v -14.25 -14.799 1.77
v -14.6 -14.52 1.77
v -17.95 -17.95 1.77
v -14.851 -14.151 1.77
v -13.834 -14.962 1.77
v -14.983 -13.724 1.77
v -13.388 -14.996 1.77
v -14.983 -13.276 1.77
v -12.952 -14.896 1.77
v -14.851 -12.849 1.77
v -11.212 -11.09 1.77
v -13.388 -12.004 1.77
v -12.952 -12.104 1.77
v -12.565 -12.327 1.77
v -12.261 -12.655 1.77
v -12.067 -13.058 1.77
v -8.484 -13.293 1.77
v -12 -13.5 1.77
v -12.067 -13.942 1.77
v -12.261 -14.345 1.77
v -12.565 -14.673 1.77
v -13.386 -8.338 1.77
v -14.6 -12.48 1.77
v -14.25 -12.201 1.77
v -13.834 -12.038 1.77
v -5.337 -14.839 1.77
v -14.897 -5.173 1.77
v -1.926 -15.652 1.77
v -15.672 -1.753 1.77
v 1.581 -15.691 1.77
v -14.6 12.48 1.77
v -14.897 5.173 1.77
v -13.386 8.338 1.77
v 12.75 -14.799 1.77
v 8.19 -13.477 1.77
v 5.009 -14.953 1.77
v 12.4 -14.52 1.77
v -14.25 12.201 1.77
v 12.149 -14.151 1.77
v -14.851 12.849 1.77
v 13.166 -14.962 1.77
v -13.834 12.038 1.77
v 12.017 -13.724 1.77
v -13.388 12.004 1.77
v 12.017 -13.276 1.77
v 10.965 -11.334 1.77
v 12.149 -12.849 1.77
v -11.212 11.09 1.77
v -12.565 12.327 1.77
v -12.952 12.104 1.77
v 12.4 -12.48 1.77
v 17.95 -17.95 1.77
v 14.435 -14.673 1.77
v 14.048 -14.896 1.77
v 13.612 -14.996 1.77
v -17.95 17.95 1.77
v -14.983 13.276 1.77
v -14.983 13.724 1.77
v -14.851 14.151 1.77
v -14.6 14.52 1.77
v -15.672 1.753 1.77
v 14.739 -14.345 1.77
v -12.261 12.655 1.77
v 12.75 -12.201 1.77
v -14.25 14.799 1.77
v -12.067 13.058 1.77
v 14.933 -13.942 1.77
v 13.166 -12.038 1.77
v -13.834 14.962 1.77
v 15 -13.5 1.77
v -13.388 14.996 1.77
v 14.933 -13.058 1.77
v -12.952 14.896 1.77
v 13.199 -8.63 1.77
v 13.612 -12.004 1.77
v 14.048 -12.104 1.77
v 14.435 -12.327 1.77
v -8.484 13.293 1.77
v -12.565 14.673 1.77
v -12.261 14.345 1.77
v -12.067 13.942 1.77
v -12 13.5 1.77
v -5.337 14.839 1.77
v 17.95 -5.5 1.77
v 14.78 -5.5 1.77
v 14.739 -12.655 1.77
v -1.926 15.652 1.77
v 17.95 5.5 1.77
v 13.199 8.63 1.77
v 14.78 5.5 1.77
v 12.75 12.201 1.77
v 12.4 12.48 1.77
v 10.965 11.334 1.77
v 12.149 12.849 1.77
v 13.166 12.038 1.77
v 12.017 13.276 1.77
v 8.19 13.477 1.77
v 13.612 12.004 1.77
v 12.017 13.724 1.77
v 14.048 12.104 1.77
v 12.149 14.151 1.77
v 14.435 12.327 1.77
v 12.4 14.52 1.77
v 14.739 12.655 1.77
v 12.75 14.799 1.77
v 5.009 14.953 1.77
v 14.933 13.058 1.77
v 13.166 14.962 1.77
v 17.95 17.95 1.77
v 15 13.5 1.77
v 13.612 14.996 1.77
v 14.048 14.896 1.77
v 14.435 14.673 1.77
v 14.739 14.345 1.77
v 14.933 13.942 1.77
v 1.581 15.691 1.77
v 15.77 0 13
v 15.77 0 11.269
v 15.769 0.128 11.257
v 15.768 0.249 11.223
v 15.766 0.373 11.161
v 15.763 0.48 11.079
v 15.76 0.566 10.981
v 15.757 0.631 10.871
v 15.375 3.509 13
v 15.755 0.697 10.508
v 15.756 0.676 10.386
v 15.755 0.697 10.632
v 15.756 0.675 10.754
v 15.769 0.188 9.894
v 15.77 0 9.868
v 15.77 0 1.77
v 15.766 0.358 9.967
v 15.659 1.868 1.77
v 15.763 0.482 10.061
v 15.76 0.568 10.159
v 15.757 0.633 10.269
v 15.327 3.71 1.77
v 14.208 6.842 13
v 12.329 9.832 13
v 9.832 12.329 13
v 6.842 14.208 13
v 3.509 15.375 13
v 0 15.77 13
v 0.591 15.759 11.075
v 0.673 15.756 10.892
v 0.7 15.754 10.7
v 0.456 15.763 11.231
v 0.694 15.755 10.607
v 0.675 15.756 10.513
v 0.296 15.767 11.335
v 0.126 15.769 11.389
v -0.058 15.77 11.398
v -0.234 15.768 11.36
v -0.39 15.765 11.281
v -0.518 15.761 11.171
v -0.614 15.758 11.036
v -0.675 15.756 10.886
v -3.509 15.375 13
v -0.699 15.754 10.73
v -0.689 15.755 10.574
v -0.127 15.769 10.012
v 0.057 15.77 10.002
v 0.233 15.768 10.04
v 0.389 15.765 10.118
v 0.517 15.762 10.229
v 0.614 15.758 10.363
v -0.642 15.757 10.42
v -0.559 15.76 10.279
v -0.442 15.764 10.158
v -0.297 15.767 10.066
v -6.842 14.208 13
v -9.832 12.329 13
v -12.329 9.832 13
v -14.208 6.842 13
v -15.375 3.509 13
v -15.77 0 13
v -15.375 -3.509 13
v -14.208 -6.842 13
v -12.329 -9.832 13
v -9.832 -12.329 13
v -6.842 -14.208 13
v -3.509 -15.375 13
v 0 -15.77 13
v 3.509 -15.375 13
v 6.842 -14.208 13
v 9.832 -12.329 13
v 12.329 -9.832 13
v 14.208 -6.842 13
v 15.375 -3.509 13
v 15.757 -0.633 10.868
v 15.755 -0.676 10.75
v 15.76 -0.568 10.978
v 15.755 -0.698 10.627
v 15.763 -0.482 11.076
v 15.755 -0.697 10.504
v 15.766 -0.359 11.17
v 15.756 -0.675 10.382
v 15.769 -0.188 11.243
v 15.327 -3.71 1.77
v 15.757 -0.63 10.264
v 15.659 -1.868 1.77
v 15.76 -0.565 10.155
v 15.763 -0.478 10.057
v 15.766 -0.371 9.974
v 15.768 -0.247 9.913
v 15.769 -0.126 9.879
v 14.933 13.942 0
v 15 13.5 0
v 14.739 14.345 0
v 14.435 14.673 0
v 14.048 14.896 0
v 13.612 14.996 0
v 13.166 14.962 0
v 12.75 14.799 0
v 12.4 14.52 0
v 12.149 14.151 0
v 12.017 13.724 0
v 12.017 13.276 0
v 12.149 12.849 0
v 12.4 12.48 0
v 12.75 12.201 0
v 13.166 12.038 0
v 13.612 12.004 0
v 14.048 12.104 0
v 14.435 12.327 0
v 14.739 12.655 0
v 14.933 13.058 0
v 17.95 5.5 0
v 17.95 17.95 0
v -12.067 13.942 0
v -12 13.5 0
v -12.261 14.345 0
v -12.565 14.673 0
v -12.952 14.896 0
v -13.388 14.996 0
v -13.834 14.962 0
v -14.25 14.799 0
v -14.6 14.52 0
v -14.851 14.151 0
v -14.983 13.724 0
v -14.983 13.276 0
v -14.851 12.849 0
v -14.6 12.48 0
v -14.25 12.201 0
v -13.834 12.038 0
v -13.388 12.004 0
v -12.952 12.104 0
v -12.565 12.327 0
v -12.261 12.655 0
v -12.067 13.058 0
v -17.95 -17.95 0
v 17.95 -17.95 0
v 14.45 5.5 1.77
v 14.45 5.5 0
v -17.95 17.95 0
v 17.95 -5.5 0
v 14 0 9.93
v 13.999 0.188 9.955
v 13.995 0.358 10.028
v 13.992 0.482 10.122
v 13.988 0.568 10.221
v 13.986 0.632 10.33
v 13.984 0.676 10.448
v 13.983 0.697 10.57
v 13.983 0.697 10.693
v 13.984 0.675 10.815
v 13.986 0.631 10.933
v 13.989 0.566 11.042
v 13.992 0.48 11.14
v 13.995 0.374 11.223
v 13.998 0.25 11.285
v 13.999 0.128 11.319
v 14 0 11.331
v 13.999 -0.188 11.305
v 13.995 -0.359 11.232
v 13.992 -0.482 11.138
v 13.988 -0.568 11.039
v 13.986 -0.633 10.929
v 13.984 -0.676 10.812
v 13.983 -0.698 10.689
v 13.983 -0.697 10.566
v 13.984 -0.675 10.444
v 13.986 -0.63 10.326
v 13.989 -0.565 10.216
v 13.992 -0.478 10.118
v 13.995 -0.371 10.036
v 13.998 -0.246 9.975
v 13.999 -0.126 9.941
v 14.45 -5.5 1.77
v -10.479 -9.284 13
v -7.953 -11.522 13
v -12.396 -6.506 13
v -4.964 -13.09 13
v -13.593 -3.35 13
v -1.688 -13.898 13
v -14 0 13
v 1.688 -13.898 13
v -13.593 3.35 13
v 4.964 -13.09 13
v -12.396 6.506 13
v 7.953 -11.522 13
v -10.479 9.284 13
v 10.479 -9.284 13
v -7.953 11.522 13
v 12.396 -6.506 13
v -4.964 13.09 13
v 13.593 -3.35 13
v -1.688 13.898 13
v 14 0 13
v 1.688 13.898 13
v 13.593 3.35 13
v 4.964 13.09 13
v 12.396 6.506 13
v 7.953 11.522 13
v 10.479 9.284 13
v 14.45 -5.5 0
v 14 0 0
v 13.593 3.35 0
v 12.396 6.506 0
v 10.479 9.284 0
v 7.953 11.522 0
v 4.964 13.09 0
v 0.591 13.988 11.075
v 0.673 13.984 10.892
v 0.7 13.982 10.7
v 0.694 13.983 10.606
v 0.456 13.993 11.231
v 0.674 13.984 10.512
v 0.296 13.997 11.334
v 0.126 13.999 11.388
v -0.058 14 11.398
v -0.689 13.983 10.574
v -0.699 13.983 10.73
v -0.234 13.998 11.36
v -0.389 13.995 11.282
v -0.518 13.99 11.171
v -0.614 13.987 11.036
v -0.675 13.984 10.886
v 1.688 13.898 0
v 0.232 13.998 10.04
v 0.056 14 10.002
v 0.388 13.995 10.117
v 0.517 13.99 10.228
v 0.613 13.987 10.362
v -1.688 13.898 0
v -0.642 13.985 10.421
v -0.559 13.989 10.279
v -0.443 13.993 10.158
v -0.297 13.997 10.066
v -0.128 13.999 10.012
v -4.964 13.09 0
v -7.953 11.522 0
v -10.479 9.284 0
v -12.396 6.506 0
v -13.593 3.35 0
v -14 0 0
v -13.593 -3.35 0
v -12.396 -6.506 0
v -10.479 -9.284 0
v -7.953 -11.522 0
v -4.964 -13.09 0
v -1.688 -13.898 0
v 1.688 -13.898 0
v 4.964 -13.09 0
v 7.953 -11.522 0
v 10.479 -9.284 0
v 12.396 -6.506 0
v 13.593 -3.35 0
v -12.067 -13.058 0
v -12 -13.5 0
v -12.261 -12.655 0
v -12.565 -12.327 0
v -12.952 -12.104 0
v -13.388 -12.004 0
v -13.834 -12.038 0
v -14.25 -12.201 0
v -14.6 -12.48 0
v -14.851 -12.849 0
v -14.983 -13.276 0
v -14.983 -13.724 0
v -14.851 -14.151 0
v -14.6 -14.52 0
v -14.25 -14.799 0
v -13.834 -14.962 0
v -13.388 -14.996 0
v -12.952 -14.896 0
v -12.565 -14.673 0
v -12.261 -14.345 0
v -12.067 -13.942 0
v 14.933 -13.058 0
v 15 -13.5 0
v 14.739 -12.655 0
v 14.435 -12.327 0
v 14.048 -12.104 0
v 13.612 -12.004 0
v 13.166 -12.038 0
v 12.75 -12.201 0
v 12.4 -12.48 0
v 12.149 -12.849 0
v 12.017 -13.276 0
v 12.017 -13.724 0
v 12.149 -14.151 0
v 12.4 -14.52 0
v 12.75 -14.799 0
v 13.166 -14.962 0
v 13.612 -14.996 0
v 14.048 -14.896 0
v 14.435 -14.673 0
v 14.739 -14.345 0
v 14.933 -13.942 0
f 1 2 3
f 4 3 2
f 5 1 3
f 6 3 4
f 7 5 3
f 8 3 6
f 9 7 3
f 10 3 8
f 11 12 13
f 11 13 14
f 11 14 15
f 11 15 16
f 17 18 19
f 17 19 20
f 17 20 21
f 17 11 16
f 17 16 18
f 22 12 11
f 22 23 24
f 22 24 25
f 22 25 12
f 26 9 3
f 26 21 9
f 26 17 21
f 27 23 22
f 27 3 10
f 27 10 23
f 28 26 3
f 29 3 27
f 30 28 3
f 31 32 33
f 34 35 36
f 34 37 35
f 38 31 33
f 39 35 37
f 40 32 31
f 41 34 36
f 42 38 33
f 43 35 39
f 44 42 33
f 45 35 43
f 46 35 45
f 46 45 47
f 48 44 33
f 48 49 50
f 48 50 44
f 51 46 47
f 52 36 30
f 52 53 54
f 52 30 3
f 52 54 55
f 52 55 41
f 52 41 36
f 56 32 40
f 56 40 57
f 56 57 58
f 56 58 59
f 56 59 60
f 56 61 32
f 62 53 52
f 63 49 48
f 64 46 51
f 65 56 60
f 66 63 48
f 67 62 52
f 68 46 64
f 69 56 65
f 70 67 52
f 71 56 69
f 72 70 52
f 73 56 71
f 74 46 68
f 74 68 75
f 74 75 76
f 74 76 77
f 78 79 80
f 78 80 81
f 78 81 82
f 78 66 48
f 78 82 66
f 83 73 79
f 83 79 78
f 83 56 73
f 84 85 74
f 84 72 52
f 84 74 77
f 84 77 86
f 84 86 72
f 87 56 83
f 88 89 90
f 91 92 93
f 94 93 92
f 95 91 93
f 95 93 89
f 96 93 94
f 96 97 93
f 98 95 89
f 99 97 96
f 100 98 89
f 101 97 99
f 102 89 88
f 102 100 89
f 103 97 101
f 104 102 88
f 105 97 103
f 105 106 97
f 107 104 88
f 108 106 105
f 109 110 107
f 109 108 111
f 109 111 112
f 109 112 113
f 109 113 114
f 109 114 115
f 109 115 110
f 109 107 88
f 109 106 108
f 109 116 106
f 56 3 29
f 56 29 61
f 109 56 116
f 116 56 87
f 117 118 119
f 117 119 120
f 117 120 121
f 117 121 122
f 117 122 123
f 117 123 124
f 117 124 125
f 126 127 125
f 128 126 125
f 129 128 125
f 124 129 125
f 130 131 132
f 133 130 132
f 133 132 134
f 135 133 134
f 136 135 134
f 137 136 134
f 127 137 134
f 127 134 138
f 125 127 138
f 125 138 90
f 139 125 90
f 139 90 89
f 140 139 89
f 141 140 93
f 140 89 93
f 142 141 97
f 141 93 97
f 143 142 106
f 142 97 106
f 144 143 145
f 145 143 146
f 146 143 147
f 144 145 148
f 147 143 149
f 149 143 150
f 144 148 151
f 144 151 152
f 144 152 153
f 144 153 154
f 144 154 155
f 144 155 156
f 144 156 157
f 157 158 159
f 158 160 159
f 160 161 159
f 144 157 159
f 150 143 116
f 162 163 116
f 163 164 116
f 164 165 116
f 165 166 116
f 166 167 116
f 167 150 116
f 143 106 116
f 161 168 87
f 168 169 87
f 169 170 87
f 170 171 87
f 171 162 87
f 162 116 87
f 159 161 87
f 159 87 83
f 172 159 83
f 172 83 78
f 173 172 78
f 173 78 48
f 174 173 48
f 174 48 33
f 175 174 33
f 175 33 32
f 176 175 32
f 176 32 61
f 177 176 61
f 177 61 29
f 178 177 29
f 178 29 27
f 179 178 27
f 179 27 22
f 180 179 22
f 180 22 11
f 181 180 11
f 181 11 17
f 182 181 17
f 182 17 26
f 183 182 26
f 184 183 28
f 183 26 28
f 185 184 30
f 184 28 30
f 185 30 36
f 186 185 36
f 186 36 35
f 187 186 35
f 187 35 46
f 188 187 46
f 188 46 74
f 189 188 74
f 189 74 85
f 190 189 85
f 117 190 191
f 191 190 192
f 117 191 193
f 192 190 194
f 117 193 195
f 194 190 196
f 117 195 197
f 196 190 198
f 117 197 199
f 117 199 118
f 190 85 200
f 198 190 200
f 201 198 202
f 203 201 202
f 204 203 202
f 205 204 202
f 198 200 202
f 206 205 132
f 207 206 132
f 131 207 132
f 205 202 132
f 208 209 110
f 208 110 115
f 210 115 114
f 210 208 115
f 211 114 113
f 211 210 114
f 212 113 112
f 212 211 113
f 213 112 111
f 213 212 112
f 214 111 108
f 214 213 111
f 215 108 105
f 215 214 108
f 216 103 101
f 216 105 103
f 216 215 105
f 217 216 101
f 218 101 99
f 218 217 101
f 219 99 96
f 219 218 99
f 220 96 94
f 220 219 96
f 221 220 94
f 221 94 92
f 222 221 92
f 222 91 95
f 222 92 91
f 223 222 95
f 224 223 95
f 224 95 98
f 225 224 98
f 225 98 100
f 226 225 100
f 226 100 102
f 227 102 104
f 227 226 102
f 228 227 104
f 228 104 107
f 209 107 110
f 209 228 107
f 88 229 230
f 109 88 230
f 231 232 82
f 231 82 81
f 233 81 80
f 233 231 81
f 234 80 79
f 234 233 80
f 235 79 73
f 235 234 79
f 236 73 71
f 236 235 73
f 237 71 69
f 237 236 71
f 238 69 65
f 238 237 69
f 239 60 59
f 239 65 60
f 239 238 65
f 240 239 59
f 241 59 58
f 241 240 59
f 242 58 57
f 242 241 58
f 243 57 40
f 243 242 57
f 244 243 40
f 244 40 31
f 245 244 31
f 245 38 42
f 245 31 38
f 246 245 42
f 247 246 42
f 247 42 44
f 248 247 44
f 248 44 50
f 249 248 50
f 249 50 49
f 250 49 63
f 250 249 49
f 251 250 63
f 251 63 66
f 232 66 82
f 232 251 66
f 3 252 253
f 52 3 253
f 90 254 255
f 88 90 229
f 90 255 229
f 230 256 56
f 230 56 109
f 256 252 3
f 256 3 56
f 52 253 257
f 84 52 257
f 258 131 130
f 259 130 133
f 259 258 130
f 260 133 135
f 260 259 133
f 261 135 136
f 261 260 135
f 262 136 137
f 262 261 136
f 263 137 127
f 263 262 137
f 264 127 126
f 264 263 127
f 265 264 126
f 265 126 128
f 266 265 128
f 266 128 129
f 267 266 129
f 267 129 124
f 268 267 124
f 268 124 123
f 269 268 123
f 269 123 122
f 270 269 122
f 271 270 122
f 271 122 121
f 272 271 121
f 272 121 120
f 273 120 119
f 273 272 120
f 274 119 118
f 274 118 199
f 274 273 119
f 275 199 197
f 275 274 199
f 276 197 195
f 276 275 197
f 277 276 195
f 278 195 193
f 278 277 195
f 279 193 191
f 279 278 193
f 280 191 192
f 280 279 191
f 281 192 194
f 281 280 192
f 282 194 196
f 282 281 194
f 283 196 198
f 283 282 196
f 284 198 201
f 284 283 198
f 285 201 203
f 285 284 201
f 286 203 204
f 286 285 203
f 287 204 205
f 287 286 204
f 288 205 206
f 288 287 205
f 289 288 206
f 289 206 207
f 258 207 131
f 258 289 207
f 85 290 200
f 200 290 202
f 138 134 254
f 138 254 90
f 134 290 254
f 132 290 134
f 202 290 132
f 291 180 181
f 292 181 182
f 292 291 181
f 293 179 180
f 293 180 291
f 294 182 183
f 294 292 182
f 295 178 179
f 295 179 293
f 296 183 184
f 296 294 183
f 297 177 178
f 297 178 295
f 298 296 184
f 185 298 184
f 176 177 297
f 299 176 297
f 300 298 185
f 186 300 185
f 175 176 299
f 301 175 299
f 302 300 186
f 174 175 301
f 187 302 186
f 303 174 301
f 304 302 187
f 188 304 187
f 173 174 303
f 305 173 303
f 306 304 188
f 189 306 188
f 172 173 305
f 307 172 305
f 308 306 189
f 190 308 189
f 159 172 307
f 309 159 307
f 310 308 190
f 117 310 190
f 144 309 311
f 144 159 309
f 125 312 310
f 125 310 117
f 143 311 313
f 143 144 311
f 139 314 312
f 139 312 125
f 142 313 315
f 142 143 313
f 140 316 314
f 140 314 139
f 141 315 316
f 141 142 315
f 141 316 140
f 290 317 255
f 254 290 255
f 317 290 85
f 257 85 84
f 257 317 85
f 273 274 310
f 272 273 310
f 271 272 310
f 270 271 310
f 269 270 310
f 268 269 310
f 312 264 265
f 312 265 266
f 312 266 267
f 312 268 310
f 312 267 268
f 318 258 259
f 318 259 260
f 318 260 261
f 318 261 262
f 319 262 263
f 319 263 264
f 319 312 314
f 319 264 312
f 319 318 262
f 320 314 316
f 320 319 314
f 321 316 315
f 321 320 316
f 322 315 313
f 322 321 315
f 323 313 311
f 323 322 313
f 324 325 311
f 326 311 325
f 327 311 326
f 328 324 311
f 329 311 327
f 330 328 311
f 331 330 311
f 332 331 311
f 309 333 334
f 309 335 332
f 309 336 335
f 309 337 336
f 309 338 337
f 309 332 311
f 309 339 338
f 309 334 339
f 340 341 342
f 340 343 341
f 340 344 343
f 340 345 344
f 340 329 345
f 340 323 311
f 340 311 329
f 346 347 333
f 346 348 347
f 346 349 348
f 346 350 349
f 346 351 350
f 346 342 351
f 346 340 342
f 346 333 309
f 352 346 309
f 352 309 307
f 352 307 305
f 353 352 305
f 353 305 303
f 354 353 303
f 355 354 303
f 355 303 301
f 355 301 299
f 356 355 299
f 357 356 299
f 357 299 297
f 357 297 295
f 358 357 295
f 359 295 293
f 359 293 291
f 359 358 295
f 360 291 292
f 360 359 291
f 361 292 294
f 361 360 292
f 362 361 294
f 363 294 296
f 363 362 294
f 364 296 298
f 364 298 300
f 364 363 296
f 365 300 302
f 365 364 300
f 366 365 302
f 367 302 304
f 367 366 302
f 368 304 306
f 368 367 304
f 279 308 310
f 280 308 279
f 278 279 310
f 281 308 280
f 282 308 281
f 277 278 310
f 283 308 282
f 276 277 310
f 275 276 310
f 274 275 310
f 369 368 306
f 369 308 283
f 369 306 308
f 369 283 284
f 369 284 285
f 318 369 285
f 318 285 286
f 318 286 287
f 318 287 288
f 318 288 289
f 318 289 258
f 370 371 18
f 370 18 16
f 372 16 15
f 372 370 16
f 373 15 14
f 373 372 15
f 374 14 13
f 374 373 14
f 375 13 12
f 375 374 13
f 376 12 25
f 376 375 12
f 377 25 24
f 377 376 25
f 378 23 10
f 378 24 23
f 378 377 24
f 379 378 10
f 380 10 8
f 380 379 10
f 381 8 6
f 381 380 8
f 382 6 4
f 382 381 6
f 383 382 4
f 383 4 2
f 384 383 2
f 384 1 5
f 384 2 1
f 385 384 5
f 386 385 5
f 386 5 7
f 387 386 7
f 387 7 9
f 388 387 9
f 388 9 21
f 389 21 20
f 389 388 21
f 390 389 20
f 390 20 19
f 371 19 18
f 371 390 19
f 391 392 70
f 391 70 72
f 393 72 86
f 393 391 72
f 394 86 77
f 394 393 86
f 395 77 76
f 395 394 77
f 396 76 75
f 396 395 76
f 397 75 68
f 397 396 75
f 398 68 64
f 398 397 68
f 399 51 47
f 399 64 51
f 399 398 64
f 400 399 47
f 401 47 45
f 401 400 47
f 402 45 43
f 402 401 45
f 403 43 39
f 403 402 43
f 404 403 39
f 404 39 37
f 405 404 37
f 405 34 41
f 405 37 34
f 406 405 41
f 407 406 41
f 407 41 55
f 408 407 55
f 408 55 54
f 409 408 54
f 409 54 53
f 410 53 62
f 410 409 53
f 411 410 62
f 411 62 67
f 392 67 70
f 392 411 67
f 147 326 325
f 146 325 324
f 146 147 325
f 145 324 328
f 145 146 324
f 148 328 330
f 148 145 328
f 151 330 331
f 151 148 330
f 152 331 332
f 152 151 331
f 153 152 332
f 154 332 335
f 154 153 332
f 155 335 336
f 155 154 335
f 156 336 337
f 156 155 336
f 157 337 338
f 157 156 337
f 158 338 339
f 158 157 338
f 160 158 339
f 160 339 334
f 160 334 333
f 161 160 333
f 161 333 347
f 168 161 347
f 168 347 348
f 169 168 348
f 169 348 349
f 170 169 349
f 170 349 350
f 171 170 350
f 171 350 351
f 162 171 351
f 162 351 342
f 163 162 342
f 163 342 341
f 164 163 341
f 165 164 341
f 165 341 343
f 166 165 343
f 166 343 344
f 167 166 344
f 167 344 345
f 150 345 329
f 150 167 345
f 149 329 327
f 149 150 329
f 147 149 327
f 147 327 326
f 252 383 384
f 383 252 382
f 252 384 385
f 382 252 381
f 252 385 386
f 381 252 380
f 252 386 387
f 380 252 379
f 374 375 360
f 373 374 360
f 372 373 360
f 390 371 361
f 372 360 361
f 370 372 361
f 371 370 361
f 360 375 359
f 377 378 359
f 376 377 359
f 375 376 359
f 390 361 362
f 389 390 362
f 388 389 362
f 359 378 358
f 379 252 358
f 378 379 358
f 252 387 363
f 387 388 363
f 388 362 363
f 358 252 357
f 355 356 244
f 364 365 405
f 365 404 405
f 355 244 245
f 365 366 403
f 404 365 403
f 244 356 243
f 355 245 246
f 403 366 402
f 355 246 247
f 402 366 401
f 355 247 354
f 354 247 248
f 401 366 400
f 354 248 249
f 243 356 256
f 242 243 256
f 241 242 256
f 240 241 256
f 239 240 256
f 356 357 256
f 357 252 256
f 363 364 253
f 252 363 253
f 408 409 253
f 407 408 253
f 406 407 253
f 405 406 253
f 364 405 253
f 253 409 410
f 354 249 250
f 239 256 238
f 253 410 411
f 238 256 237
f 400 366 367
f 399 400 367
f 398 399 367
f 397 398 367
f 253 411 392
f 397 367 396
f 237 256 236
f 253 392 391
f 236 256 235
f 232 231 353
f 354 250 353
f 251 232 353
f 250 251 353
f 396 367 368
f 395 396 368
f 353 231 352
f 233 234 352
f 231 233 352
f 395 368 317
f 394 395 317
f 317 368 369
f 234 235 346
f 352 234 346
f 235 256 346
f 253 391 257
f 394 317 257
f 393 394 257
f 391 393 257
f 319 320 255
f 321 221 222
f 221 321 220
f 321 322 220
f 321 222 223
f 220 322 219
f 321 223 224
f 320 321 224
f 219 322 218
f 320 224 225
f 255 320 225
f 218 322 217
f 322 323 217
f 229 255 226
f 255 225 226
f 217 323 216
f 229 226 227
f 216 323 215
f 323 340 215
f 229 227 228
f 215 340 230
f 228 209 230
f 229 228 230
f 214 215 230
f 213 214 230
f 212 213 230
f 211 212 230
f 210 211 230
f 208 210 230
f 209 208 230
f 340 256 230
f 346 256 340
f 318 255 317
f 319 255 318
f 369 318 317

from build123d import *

# Parameters (mm, degrees)
BOX001_W                    = 3.5
BOX001_H                    = 11
BOX001_DEPTH                = 1.77
CYLINDER002_R               = 0.7
CYLINDER002_DEPTH           = 10
CYLINDER002_PLACEMENT_ANGLE = 92
CYLINDER007_R               = 0.7
CYLINDER007_DEPTH           = 10
CYLINDER007_ROLL_ANGLE      = 90
CYLINDER_R                  = 14
CYLINDER_DEPTH              = 13
THICKNESS_T                 = 1.77
CYLINDER003_R               = 1.5
CYLINDER003_DEPTH           = 10
CYLINDER004_R               = 1.5
CYLINDER004_DEPTH           = 10
CYLINDER005_R               = 1.5
CYLINDER005_DEPTH           = 10
CYLINDER006_R               = 1.5
CYLINDER006_DEPTH           = 10
CYLINDER001_R               = 14
CYLINDER001_DEPTH           = 10
BOX_W                       = 35.9
BOX_H                       = 35.9
BOX_DEPTH                   = 1.77


with BuildPart() as cube001:
    # Box001 → Box001 (new body)
    with BuildSketch(Plane(origin=(14.45, -5.5, 0), x_dir=(1, 0, 0), z_dir=(0, 0, 1))):
        with Locations((1.75, 5.5)):
            Rectangle(BOX001_W, BOX001_H)
    extrude(amount=BOX001_DEPTH)


with BuildPart() as cylinder002:
    # Cylinder002 → Cylinder002 (new body)
    with BuildSketch(Plane.XY):
        Circle(CYLINDER002_R)
    extrude(amount=CYLINDER002_DEPTH)


with BuildPart() as cylinder002_1:
    # Cylinder002 placement: moved
    add(cylinder002.part.moved(Location((12, 0, 10.7))).rotate(Axis((12, 0, 10.7), (0, 1, 0)), CYLINDER002_PLACEMENT_ANGLE))


with BuildPart() as cylinder007:
    # Cylinder007 → Cylinder007 (new body)
    with BuildSketch(Plane.XY):
        Circle(CYLINDER007_R)
    extrude(amount=CYLINDER007_DEPTH)


with BuildPart() as cylinder007_1:
    # Cylinder007 roll: moved
    add(cylinder007.part.rotate(Axis((0, 0, 0), (1, 0, 0)), CYLINDER007_ROLL_ANGLE))


with BuildPart() as cylinder007_2:
    # Cylinder007 placement: moved
    add(cylinder007_1.part.moved(Location((0, 21, 10.7))))


with BuildPart() as lens_conduit:
    # Cylinder → Cylinder (new body)
    with BuildSketch(Plane.XY):
        Circle(CYLINDER_R)
    extrude(amount=CYLINDER_DEPTH)

    # Thickness
    thickness_openings = [lens_conduit.faces().sort_by_distance(p)[0] for p in [
        (0, 0, 13),
        (0, 0, 0),
    ]]
    offset(amount=THICKNESS_T, openings=thickness_openings)

    # Cut005: cut Cylinder007
    add(cylinder007_2.part, mode=Mode.SUBTRACT)

    # Cut006: cut Cylinder002
    add(cylinder002_1.part, mode=Mode.SUBTRACT)

    # Cut008: cut Cube001
    add(cube001.part, mode=Mode.SUBTRACT)


with BuildPart() as cylinder003:
    # Cylinder003 → Cylinder003 (new body)
    with BuildSketch(Plane(origin=(13.5, 13.5, -2), x_dir=(1, 0, 0), z_dir=(0, 0, 1))):
        Circle(CYLINDER003_R)
    extrude(amount=CYLINDER003_DEPTH)


with BuildPart() as cylinder004:
    # Cylinder004 → Cylinder004 (new body)
    with BuildSketch(Plane(origin=(13.5, -13.5, -2), x_dir=(1, 0, 0), z_dir=(0, 0, 1))):
        Circle(CYLINDER004_R)
    extrude(amount=CYLINDER004_DEPTH)


with BuildPart() as cylinder005:
    # Cylinder005 → Cylinder005 (new body)
    with BuildSketch(Plane(origin=(-13.5, 13.5, -2), x_dir=(1, 0, 0), z_dir=(0, 0, 1))):
        Circle(CYLINDER005_R)
    extrude(amount=CYLINDER005_DEPTH)


with BuildPart() as cylinder006:
    # Cylinder006 → Cylinder006 (new body)
    with BuildSketch(Plane(origin=(-13.5, -13.5, -2), x_dir=(1, 0, 0), z_dir=(0, 0, 1))):
        Circle(CYLINDER006_R)
    extrude(amount=CYLINDER006_DEPTH)


with BuildPart() as cylinder001:
    # Cylinder001 → Cylinder001 (new body)
    with BuildSketch(Plane.XY.offset(-3)):
        Circle(CYLINDER001_R)
    extrude(amount=CYLINDER001_DEPTH)


with BuildPart() as fusion:
    # Box → Box (new body)
    with BuildSketch(Plane(origin=(-17.95, -17.95, 0), x_dir=(1, 0, 0), z_dir=(0, 0, 1))):
        with Locations((17.95, 17.95)):
            Rectangle(BOX_W, BOX_H)
    extrude(amount=BOX_DEPTH)

    # Cut: cut Cylinder001
    add(cylinder001.part, mode=Mode.SUBTRACT)

    # Cut001: cut Cylinder006
    add(cylinder006.part, mode=Mode.SUBTRACT)

    # Cut002: cut Cylinder005
    add(cylinder005.part, mode=Mode.SUBTRACT)

    # Cut003: cut Cylinder004
    add(cylinder004.part, mode=Mode.SUBTRACT)

    # Cut004: cut Cylinder003
    add(cylinder003.part, mode=Mode.SUBTRACT)

    # Cut007: cut Cube001
    add(cube001.part, mode=Mode.SUBTRACT)

    # Fusion: union lens_conduit
    add(lens_conduit.part)


solid = fusion.part
